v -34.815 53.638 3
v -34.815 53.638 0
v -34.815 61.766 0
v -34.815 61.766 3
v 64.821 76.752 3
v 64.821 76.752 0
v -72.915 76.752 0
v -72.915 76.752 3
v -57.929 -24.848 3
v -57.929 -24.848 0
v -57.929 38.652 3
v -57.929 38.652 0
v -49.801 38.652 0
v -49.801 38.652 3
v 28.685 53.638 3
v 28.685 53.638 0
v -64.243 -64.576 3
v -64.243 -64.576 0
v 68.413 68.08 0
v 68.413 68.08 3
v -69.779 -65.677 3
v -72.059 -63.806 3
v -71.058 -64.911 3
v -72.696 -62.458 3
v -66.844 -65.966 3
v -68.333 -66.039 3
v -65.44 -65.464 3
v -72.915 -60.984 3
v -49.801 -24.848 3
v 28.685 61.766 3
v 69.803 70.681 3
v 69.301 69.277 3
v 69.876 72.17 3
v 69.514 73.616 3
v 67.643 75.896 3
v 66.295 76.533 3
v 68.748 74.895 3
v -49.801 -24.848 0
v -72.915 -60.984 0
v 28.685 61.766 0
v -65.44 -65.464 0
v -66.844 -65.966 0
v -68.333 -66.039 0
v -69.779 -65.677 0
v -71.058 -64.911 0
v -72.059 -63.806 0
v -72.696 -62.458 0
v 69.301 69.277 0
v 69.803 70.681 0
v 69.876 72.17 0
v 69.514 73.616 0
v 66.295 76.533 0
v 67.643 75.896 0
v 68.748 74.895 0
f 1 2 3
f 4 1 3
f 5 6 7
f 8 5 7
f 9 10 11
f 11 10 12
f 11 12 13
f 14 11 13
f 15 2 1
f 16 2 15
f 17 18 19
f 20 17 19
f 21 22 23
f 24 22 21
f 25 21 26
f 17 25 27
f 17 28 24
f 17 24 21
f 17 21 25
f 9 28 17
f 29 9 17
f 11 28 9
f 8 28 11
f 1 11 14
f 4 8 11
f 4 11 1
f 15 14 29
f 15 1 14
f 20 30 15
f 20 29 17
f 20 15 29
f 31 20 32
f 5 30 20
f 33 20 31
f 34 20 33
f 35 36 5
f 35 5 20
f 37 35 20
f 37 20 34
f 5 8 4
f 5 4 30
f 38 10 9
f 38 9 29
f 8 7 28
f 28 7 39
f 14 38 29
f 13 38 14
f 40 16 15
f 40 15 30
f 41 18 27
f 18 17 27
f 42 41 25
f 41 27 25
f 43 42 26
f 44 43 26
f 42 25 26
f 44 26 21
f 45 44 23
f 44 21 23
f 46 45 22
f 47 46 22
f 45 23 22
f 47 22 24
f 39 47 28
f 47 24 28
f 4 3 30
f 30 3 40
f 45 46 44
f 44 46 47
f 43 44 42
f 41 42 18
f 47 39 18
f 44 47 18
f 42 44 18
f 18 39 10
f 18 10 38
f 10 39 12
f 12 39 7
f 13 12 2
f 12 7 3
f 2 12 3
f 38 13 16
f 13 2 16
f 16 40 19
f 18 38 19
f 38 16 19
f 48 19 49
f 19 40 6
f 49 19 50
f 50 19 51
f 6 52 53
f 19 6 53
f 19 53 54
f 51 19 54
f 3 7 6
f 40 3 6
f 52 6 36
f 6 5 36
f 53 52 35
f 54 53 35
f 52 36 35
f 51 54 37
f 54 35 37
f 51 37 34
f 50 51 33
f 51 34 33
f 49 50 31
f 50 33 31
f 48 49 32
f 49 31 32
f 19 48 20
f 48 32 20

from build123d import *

# Parameters (mm, degrees)
F0_W     = 8.128
F0_H     = 63.5
F0_W_2   = 63.5
F0_H_2   = 8.128
F1_DEPTH = 3
F2_R     = 5.08


with BuildPart() as f1:
    # F0 (on Top) → F1 (new body)
    with BuildSketch(Plane.XY):
        Polygon((77.085001, 76.752045), (-72.914999, 76.752045), (-72.914999, -73.247955), align=None)
        with Locations((-53.864999, 6.902045)):
            Rectangle(F0_W, F0_H, mode=Mode.SUBTRACT)
        with Locations((-3.064999, 57.702045)):
            Rectangle(F0_W_2, F0_H_2, mode=Mode.SUBTRACT)
    extrude(amount=F1_DEPTH)

    # F2
    f2_edges = [f1.edges().sort_by_distance(p)[0] for p in [
        (-72.914999, -73.247955, 1.5),
        (77.085001, 76.752045, 1.5),
    ]]
    fillet(f2_edges, radius=F2_R)


solid = f1.part
